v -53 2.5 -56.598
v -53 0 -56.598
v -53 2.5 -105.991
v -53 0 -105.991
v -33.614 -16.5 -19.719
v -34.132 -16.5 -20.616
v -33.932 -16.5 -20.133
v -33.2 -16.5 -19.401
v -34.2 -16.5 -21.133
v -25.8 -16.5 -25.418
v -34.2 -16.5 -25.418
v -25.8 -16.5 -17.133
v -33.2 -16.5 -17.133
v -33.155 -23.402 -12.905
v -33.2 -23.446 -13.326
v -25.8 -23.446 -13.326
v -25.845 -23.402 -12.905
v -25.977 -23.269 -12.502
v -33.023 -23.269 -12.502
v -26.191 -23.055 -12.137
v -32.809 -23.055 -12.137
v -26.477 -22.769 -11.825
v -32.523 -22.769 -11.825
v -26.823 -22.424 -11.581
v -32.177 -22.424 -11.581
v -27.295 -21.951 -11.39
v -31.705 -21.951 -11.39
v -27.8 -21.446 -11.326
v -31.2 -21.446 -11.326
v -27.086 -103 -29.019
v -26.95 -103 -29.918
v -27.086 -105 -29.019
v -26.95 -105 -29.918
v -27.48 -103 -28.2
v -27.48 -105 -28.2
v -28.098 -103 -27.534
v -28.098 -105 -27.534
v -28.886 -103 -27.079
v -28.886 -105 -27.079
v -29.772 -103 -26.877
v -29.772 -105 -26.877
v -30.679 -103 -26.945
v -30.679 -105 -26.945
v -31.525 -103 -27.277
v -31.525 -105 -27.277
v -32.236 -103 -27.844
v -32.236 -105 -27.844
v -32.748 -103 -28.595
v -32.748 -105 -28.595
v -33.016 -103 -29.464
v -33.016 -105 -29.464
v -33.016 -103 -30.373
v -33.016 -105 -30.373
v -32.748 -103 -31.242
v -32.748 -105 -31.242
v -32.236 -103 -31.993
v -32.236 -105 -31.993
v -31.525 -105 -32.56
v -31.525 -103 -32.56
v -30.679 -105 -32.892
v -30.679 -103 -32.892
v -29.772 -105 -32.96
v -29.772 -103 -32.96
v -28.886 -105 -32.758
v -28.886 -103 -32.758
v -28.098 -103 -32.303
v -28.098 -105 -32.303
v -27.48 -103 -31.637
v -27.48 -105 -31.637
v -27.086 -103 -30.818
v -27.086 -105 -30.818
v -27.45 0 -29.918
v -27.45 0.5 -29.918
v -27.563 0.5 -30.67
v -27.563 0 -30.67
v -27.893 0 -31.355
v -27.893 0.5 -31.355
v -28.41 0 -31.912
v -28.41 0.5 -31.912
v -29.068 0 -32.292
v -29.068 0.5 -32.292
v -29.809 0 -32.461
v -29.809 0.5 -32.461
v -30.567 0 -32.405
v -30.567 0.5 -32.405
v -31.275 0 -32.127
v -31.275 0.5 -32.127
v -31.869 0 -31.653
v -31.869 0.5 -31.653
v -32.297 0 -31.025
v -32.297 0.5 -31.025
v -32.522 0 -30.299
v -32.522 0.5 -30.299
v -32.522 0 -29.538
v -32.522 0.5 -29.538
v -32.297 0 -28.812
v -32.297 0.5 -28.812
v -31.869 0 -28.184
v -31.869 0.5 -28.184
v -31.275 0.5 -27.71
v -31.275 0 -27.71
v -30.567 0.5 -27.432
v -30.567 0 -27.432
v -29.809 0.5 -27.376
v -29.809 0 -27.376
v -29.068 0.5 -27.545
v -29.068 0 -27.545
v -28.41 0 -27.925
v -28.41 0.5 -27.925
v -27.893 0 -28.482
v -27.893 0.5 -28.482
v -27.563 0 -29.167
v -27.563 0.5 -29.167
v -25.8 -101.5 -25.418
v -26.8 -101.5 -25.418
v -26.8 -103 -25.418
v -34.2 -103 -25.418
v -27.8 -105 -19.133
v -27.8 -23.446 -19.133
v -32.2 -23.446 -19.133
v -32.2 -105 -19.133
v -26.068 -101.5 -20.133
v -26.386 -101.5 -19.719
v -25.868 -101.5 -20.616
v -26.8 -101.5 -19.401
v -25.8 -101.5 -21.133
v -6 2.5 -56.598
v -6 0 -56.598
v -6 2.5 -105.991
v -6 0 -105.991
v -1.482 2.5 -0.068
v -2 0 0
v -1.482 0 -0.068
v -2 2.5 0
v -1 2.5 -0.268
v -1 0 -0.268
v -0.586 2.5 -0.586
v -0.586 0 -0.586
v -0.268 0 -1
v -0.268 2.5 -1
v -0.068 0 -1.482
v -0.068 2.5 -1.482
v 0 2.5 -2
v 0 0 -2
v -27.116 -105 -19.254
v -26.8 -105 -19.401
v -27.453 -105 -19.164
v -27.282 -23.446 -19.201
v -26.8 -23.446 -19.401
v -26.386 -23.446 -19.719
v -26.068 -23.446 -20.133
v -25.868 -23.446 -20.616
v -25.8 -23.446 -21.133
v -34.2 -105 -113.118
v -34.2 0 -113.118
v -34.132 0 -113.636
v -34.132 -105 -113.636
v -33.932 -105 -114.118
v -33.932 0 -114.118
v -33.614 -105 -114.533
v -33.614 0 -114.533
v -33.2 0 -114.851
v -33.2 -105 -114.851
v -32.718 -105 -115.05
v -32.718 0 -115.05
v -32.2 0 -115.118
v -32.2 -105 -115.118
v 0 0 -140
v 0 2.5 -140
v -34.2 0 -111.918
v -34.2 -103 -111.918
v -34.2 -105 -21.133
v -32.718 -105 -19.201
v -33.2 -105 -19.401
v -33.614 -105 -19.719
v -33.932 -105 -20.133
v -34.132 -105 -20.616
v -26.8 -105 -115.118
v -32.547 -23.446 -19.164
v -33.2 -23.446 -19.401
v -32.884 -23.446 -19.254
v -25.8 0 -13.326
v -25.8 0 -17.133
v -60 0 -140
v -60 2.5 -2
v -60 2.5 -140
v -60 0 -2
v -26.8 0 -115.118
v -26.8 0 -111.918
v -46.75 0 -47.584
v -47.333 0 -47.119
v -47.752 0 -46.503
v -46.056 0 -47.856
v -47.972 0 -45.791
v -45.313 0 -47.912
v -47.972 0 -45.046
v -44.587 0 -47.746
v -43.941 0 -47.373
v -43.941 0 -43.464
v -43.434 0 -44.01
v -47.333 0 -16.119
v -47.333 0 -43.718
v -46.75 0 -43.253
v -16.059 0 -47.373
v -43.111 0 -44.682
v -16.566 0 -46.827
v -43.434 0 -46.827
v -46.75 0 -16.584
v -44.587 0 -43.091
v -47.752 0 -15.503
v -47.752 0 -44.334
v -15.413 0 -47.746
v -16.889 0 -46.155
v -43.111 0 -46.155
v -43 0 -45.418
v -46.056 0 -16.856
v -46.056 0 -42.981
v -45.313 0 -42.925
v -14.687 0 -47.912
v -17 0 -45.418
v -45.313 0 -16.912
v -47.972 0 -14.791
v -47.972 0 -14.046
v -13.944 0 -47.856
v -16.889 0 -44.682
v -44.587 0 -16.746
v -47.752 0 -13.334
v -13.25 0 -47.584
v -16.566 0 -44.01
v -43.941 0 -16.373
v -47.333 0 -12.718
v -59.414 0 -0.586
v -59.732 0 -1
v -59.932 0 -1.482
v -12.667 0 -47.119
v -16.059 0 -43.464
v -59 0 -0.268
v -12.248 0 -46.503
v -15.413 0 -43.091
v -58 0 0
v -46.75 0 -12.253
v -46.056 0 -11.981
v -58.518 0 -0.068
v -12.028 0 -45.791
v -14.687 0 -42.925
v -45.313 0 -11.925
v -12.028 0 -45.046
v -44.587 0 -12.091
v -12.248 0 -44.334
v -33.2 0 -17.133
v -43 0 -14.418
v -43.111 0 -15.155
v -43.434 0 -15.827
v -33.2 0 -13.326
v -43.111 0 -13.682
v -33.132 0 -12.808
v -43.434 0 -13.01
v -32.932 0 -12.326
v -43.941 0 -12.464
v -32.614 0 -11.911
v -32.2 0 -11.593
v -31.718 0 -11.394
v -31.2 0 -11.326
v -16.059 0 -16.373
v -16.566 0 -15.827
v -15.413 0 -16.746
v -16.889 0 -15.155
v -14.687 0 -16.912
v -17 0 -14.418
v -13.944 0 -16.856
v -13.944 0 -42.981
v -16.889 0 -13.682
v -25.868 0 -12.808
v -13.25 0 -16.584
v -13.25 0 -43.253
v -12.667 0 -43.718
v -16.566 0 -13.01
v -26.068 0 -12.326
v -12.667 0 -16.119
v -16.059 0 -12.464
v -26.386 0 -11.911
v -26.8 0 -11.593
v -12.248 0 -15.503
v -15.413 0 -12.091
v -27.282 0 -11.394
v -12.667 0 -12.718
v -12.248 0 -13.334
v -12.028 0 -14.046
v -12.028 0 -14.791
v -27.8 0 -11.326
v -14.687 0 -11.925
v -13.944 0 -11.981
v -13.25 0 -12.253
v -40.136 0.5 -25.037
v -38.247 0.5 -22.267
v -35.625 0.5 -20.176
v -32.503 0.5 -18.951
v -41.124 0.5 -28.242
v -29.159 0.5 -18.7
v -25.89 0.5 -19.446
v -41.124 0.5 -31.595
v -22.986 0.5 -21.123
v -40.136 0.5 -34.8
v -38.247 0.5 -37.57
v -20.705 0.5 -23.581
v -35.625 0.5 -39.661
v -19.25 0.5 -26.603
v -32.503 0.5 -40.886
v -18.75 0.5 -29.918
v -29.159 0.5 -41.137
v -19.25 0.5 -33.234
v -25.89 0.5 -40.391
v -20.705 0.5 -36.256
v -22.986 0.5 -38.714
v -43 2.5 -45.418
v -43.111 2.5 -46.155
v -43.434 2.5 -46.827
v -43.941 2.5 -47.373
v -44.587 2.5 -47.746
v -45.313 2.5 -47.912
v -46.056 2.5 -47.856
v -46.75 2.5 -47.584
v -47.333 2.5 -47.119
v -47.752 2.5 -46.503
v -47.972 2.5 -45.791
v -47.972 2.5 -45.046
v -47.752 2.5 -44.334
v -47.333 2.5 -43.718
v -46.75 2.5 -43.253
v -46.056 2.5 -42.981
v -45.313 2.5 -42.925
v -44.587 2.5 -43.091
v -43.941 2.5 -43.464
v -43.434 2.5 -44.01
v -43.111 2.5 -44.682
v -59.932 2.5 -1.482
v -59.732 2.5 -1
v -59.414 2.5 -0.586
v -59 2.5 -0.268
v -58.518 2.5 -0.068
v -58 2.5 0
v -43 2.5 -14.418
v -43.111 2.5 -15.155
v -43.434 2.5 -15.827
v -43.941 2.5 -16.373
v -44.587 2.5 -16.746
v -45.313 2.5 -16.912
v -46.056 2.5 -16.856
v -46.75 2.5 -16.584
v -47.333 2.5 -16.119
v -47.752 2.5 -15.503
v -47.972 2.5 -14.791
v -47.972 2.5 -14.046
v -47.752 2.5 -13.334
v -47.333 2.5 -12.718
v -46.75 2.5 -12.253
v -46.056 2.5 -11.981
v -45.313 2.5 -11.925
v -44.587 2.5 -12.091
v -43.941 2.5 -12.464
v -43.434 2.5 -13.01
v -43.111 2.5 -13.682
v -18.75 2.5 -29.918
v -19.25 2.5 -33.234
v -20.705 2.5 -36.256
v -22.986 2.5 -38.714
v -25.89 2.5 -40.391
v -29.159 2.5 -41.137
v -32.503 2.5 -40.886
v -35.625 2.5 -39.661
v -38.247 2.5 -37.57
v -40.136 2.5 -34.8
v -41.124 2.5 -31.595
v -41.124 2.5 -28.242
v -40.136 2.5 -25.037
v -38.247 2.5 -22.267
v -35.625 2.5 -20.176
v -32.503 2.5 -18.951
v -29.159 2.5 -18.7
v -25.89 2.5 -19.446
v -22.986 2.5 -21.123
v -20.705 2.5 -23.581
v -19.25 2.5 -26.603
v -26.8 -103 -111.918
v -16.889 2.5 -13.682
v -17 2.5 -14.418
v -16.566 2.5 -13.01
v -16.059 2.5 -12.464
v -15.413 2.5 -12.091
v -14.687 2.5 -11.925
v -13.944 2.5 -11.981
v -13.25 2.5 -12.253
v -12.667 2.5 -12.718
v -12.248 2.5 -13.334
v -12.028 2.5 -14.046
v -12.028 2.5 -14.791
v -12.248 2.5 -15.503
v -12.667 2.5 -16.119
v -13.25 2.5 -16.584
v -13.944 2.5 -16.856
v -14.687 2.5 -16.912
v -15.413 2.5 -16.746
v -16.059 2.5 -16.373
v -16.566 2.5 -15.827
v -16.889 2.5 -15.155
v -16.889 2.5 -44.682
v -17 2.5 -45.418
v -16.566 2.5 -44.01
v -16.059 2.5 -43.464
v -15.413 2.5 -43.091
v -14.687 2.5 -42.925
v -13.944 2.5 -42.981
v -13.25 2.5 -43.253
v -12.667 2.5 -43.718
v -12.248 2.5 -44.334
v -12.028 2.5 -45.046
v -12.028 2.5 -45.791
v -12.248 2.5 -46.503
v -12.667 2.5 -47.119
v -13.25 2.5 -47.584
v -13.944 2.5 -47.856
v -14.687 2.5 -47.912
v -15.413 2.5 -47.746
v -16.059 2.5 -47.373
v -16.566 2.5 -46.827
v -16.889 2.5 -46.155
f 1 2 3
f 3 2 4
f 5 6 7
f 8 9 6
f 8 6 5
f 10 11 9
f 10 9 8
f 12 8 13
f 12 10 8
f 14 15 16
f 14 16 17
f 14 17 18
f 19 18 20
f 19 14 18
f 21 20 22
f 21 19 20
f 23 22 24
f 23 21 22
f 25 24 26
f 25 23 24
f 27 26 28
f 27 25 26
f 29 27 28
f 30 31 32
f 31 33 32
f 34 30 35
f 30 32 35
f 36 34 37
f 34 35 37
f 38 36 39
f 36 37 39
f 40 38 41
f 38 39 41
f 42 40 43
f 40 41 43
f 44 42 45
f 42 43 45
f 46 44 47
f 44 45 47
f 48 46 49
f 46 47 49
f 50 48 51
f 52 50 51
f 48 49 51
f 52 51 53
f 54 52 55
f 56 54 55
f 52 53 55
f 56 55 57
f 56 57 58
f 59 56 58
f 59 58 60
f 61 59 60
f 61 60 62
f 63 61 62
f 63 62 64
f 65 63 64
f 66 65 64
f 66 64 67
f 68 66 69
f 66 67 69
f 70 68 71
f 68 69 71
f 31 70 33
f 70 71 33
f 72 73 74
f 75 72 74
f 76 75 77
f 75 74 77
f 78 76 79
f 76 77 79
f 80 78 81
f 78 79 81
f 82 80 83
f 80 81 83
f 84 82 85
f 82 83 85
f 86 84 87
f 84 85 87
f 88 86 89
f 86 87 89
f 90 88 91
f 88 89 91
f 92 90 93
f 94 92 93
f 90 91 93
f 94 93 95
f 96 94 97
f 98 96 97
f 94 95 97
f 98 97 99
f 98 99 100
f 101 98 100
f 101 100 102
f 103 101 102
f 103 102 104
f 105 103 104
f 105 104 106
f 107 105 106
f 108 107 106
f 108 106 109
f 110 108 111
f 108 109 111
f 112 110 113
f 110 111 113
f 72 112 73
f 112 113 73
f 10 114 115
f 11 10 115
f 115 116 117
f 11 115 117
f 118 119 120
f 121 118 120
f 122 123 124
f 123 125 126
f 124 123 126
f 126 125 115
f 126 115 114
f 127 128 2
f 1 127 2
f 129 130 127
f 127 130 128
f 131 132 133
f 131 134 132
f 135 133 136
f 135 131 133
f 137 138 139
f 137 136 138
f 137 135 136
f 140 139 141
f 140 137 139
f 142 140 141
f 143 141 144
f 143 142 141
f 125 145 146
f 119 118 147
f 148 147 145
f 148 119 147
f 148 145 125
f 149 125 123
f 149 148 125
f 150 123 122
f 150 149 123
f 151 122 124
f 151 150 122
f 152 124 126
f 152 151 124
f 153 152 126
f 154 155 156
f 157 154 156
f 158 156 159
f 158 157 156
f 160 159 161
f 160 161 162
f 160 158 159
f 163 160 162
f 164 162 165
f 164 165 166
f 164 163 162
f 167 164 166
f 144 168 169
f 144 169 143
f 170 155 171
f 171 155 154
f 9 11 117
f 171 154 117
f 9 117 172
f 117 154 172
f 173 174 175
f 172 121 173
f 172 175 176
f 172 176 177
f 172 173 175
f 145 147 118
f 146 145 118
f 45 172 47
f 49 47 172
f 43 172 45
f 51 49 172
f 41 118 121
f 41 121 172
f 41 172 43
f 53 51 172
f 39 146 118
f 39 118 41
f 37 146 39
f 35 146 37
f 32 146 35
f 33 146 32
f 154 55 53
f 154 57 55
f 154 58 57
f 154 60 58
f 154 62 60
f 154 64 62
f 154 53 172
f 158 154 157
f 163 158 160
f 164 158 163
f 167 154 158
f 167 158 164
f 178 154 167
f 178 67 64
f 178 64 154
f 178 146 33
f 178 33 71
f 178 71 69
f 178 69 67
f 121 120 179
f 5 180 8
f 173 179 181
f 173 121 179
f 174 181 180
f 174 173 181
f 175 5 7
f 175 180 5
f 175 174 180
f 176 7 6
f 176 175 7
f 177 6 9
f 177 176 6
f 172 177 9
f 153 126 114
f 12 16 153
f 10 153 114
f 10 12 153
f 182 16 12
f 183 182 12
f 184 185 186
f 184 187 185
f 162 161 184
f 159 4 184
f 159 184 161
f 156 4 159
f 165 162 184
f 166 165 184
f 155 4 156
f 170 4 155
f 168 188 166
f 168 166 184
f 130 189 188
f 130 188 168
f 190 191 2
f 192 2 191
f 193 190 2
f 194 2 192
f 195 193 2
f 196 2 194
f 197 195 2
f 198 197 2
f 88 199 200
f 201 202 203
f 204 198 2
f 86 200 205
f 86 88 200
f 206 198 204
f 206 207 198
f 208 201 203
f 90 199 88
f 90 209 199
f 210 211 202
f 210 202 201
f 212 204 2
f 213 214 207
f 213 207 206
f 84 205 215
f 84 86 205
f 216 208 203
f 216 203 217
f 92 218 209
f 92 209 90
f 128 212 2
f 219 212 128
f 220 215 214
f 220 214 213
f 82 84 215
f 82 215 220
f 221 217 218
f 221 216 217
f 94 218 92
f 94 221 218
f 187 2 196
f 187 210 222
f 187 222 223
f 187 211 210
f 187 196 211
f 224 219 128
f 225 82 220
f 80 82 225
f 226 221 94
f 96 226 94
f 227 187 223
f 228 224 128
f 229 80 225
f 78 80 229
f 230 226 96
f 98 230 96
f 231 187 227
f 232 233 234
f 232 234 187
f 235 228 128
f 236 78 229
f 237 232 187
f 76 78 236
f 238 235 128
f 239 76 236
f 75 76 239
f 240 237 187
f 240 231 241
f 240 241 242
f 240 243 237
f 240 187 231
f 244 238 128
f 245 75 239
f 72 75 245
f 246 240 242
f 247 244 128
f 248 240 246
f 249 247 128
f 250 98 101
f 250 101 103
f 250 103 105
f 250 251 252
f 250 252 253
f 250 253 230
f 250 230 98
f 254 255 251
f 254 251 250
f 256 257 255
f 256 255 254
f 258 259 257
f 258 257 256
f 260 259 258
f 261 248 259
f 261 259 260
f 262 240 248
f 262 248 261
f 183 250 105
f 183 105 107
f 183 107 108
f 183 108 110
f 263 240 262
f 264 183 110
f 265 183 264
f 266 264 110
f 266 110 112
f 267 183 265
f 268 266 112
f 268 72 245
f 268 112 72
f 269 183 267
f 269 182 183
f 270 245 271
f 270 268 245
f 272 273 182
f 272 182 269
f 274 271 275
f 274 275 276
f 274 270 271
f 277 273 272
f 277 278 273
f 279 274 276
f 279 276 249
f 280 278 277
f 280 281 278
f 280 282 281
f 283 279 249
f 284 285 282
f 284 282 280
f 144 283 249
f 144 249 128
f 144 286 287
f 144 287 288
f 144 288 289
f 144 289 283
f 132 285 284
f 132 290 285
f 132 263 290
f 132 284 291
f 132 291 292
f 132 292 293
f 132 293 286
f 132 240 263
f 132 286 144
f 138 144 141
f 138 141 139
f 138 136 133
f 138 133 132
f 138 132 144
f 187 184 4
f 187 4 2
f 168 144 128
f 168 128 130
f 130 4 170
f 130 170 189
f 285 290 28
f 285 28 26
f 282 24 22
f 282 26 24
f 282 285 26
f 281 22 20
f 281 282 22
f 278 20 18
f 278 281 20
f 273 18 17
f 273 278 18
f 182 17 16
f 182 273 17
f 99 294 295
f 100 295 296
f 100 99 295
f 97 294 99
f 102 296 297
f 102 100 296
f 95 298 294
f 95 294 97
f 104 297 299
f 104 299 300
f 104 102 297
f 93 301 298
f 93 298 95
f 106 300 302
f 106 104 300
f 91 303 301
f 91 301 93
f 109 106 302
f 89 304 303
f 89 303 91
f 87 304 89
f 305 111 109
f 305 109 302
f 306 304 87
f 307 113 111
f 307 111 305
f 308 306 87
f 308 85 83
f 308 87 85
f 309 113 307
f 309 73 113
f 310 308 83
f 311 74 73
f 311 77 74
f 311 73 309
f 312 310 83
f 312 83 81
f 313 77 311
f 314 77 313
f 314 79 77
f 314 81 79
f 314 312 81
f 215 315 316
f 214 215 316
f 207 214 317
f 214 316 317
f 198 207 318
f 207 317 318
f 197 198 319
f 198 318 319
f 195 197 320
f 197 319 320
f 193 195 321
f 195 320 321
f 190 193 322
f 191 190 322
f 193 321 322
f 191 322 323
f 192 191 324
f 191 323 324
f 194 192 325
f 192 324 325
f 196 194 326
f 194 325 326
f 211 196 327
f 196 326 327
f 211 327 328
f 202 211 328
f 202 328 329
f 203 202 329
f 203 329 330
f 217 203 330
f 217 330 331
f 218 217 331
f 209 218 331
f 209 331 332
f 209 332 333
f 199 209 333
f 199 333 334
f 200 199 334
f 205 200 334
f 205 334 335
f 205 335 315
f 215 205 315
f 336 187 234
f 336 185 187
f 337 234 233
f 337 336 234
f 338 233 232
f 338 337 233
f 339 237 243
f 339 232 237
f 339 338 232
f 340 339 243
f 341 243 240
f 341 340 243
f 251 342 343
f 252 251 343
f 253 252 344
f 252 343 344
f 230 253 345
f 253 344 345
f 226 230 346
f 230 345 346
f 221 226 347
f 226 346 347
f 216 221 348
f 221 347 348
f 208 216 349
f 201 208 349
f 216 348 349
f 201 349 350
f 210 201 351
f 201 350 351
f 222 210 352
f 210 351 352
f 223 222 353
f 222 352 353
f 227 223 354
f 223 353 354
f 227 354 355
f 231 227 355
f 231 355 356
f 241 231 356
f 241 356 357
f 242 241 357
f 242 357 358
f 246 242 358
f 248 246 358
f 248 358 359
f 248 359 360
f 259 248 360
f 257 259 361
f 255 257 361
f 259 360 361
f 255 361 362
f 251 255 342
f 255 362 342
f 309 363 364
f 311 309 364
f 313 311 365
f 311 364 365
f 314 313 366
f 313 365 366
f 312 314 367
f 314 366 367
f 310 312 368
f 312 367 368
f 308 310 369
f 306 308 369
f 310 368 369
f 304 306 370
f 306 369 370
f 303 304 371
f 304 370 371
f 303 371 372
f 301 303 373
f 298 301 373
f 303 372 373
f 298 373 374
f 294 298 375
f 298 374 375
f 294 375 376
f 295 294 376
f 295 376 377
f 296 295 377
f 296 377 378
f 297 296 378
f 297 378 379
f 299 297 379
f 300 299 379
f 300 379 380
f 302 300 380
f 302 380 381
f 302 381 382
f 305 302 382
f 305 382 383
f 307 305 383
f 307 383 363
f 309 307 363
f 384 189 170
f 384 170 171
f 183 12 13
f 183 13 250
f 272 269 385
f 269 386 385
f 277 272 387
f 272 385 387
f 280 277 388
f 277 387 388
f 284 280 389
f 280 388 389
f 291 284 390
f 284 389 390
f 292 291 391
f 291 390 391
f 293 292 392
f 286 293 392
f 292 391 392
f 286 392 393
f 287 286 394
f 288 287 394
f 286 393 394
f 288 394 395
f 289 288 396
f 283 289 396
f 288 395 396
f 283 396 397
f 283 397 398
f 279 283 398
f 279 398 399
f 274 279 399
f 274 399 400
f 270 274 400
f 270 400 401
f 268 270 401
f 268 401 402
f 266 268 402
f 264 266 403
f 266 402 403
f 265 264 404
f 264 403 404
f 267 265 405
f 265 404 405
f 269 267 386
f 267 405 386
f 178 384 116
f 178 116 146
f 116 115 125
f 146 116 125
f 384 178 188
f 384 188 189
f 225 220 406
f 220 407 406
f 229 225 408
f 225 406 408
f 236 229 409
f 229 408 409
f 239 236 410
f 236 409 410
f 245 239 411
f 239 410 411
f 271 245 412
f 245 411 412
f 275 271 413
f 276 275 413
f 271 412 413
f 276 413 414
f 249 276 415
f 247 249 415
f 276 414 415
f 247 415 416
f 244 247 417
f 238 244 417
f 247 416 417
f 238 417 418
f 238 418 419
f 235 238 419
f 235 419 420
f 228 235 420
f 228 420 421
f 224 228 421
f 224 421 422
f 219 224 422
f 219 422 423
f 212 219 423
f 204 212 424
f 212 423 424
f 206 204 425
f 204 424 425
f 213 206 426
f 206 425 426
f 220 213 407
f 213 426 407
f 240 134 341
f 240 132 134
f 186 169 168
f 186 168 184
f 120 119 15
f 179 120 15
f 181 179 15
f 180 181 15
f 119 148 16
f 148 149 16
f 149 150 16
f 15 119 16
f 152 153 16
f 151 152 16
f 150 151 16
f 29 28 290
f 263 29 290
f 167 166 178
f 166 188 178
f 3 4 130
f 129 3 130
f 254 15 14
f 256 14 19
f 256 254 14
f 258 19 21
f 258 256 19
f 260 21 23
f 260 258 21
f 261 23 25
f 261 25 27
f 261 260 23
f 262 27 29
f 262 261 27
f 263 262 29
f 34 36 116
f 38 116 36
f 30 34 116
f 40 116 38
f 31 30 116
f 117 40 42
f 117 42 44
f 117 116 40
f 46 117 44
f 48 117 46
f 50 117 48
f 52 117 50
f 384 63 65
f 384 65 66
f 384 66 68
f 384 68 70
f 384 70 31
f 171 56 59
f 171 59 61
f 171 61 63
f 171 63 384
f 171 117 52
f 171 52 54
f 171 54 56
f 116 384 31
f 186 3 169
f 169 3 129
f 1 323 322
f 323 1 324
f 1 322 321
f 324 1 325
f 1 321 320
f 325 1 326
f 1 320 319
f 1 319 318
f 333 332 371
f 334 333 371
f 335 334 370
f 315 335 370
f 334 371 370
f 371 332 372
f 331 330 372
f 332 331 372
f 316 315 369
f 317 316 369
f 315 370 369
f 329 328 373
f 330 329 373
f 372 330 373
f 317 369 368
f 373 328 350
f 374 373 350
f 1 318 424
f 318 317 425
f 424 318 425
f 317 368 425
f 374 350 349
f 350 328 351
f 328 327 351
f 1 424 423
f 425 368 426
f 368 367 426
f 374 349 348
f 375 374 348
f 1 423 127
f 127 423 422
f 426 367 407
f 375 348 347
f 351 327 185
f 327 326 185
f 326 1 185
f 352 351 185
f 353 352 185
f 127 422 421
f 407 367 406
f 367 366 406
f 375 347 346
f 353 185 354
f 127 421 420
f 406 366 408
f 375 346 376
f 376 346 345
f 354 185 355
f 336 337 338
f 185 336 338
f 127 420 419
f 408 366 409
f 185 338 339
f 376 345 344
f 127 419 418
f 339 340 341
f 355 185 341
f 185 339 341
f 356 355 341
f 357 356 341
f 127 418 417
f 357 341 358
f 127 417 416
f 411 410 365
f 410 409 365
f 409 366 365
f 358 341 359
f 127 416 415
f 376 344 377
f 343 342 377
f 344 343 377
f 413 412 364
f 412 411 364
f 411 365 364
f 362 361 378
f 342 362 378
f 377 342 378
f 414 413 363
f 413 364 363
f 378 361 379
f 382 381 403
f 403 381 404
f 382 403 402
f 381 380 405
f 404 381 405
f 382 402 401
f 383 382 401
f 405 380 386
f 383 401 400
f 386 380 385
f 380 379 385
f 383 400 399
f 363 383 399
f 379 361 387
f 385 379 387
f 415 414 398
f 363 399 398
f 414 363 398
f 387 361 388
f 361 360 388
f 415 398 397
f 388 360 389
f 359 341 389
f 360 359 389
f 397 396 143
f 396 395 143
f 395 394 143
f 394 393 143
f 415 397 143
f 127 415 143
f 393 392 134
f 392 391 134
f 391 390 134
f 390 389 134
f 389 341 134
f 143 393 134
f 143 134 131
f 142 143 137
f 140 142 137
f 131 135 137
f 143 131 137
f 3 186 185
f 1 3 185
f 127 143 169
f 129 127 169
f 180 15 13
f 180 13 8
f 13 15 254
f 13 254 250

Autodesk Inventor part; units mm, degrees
ref_plane "YZ Plane" through (0, 0, 0) normal (1, 0, 0) x (0, 1, 0)
ref_plane "XZ Plane" through (0, 0, 0) normal (0, 1, 0) x (-1, 0, 0)
ref_plane "XY Plane" through (0, 0, 0) normal (0, 0, 1) x (1, 0, 0)
sketch "草图1" plane through (0, 0, 0) normal (0, 1, 0) x (-1, 0, 0)
  line L0 (0, 0) -> (60, 0)
  line L1 (60, 0) -> (60, -140)
  line L2 (60, -140) -> (0, -140)
  line L3 (0, -140) -> (0, 0)
  dimension "d0" = 60
  dimension "d1" = 140
extrude "拉伸1" add sketch "草图1" along normal blind 2.5
sketch "草图2" plane through (0, 2.5, 0) normal (0, 1, 0) x (1, 0, 0)
  line L0 (0, 140) -> (-60, 140) projected
  line L1 (-60, 140) -> (-60, 0) projected
  line L2 (-60, 0) -> (0, 0) projected
  line L3 (0, 0) -> (0, 140) projected
  line L4 (-60, 0) -> (0, 0) projected
  line L5 (-30, 0) -> (-30, 146.6003)
  line L6 (-30, 8.9185) -> (-51, 8.9185)
  line L7 (-51, 8.9185) -> (-51, 50.9185)
  line L8 (-51, 50.9185) -> (-30, 50.9185)
  line L9 (-30, 50.9185) -> (-30, 8.9185)
  line L10 (-30, 8.9185) -> (-9, 8.9185)
  line L11 (-9, 8.9185) -> (-9, 50.9185)
  line L12 (-9, 50.9185) -> (-30, 50.9185)
  circle A0 centre (-45.5, 14.4185) radius 2.9433
  line L13 (-51, 29.9185) -> (-35.5931, 29.9185)
  circle A1 centre (-45.5, 45.4185) radius 2.9433
  circle A2 centre (-14.5, 14.4185) radius 2.9433
  circle A3 centre (-14.5, 45.4185) radius 2.9433
  circle A4 centre (-30, 29.9185) radius 2.55
  circle A5 centre (-30, 29.9185) radius 11.25
  dimension "d4" = 21
  dimension "d5" = 42
  dimension "d6" = 31
  dimension "d7" = 31
  dimension "d12" = 5.1
  dimension "d15" = 22.5
extrude "拉伸4" cut sketch "草图2" along normal mid plane 10 contours A4 L5 | L5 A4
extrude "拉伸5" cut sketch "草图2" against normal blind 10 contours A5 L5 A4 | L5 A4 A5 | A4 L5 | L5 A4
extrude "拉伸6" cut sketch "草图2" against normal blind 10 contours A5 L5 A4 | L5 A4 A5 | A4 L5 | L5 A4
sketch "草图6" plane through (0, 0, 0) normal (0, -1, 0) x (1, 0, 0)
  line L0 (-9, -8.9185) -> (-51, -8.9185) projected
  circle A0 centre (-30, -29.9185) radius 2.55 projected
  line L1 (-30, -29.9185) -> (-26.8, -29.9185)
  line L2 (-26.8, -29.9185) -> (-26.8, -111.9185)
  line L3 (-30, -29.9185) -> (-30, -39.9264)
  line L4 (-30, -29.9185) -> (-33.2, -29.9185)
  line L5 (-33.2, -29.9185) -> (-33.2, -111.9185)
  line L6 (-26.8, -111.9185) -> (-31.6, -111.9185)
  line L7 (-31.6, -111.9185) -> (-33.2, -111.9185)
  line L8 (-26.8, -111.9185) -> (-33.2, -111.9185)
  line L9 (-33.2, -111.9185) -> (-33.2, -115.1185)
  line L10 (-33.2, -115.1185) -> (-26.8, -115.1185)
  line L11 (-26.8, -115.1185) -> (-26.8, -111.9185)
  point P0 (0, 0)
  dimension "d20" = 3.2
  dimension "d21" = 82
  dimension "d22" = 3.2
extrude "拉伸7" add sketch "草图6" along normal blind 105 contours L11 L10 L9 L7 L6
sketch "草图7" plane through (-33.2, 0, -111.9185) normal (0, 0, 1) x (1, 0, 0)
  line L0 (0, 0) -> (6.4, 0) projected
  line L1 (0, 0) -> (0, -105) projected
  line L2 (6.4, -105) -> (0, -105) projected
  line L3 (6.4, 0) -> (6.4, -105) projected
  line L4 (6.4, 0) -> (6.4, -105) projected
  line L5 (0, 0) -> (0, -105) projected
  line L6 (6.4, -105) -> (0, -105)
  line L7 (0, -105) -> (0, -101.5)
  line L8 (0, -101.5) -> (6.4, -101.5)
  line L9 (6.4, -101.5) -> (6.4, -105)
  point P0 (33.2, 0)
  dimension "d25" = 3.5
sketch "草图8" plane through (0, -105, 0) normal (0, -1, 0) x (1, 0, 0)
  line L0 (-26.8, -111.9185) -> (-26.8, -115.1185) projected
  line L1 (-26.8, -115.1185) -> (-33.2, -115.1185) projected
  line L2 (-33.2, -115.1185) -> (-33.2, -111.9185) projected
  line L3 (-33.2, -111.9185) -> (-26.8, -111.9185) projected
  circle A0 centre (-30, -29.9185) radius 11.25 projected
  line L4 (0, -140) -> (-60, -140) projected
  line L5 (0, 0) -> (0, -140) projected
  line L6 (-60, 0) -> (0, 0) projected
  line L7 (-60, -140) -> (-60, 0) projected
  line L8 (-26.8, -111.9185) -> (-26.8, -29.9185)
  line L9 (-26.8, -29.9185) -> (-33.2, -29.9185)
  line L10 (-33.2, -29.9185) -> (-33.2, -111.9185)
  line L11 (-33.2, -111.9185) -> (-26.8, -111.9185)
  line L12 (-26.8, -111.9185) -> (-26.8, -29.9185)
  circle A1 centre (-30, -29.9185) radius 3.2
  line L13 (-26.8, -29.9185) -> (-26.8, -14.9185)
  line L14 (-26.8, -14.9185) -> (-33.2, -14.9185)
  line L15 (-33.2, -14.9185) -> (-33.2, -29.9185)
  circle A2 centre (-30, -29.9185) radius 2.55 projected
  line L16 (-26.8, -14.9185) -> (-26.8, -25.4185)
  line L17 (-26.8, -25.4185) -> (-33.2, -25.4185)
  dimension "d26" = 15
  dimension "d40" = 10.5
extrude "拉伸8" add sketch "草图8" against normal blind 3.5 contours L3 L10 A0 L8 | A0 L10 A1 L8 | A1 L9 A2 | L9 A2 A1 | A1 L15 L17 L13 | L15 L14 L13 A0 | A0 L13 L17 L15
sketch "草图10" plane through (0, -105, 0) normal (0, -1, 0) x (1, 0, 0)
  line L0 (-26.8, -111.9185) -> (-26.8, -115.1185) projected
  line L1 (-26.8, -115.1185) -> (-33.2, -115.1185) projected
  line L2 (-33.2, -115.1185) -> (-33.2, -111.9185) projected
  line L3 (-33.2, -111.9185) -> (-26.8, -111.9185) projected
  circle A0 centre (-30, -29.9185) radius 11.25 projected
  line L4 (0, -140) -> (-60, -140) projected
  line L5 (0, 0) -> (0, -140) projected
  line L6 (-60, 0) -> (0, 0) projected
  line L7 (-60, -140) -> (-60, 0) projected
  circle A1 centre (-30, -29.9185) radius 2.55 projected
  line L8 (-33.2, -14.9185) -> (-33.2, -115.1185) projected
  line L9 (-33.2, -115.1185) -> (-26.8, -115.1185) projected
  line L10 (-26.8, -115.1185) -> (-26.8, -14.9185) projected
  line L11 (-26.8, -14.9185) -> (-33.2, -14.9185) projected
  circle A2 centre (-30, -29.9185) radius 3.05
  point P0 (-33.2, -19.1332)
  point P1 (-26.8, -19.1332)
  dimension "d31" = 6.1
extrude "拉伸9" add sketch "草图10" against normal up to surface (105 mm away) contours A0 L8 L11 L10
extrude "拉伸10" cut sketch "草图10" against normal up to surface (3.5 mm away) contours A2
sketch "草图11" plane through (-33.2, -105, -115.1185) normal (-1, 0, 0) x (0, 0, 1)
  line L0 (3.2, 3.5) -> (95.9853, 3.5) projected
  line L1 (3.2, 105) -> (3.2, 3.5) projected
  line L2 (0, 105) -> (3.2, 105) projected
  line L3 (0, 105) -> (0, 0) projected
  line L4 (100.2, 0) -> (0, 0) projected
  line L5 (100.2, 0) -> (100.2, 105) projected
  line L6 (95.9853, 105) -> (100.2, 105) projected
  line L7 (95.9853, 3.5) -> (95.9853, 105) projected
  point P0 (115.1185, 105)
extrude "拉伸11" add sketch "草图11" along normal blind 1
sketch "草图12" plane through (0, 0, 0) normal (0, -1, 0) x (1, 0, 0)
  point P0 (0, 0)
extrude "拉伸12" add sketch "草图2" against normal up to surface (2.5 mm away) contours A5 L5 A4 | L5 A4 A5
sketch "草图13" plane through (-30, 2.5, -29.9185) normal (0, 1, 0) x (1, 0, 0)
  point P0 (30, -29.9185)
extrude "拉伸13" cut sketch "草图2" against normal blind 2 contours A5 L5 A4 | L5 A4 A5
sketch "草图14" plane through (0, -105, 0) normal (0, -1, 0) x (1, 0, 0)
  circle A0 centre (-30, -29.9185) radius 3.05 projected
  line L0 (-26.8, -115.1185) -> (-34.2, -115.1185) projected
  line L1 (-26.8, -14.9185) -> (-34.2, -14.9185) projected
  line L2 (-34.2, -115.1185) -> (-34.2, -14.9185) projected
  line L3 (-34.2, -115.1185) -> (-34.2, -14.9185) projected
  line L4 (-34.2, -19.1332) -> (-34.2, -14.9185) projected
  line L5 (-34.2, -19.1332) -> (-34.2, -111.9185) projected
  line L6 (-34.2, -115.1185) -> (-34.2, -111.9185) projected
  line L7 (-33.2, -19.1332) -> (-34.2, -19.1332) projected
  line L8 (-34.2, -19.1332) -> (-25.8, -19.1332)
  line L9 (-25.8, -115.1185) -> (-25.8, -14.9185) projected
  line L10 (-26.8, -115.1185) -> (-26.8, -14.9185) projected
  point P0 (0, 0)
  point P1 (-26.8, -19.1332)
extrude "拉伸14" cut sketch "草图14" against normal up to surface (105 mm away) contours L8 L7 L2 L1 L10
sketch "草图15" plane through (0, -101.5, 0) normal (0, 1, 0) x (1, 0, 0)
  line L0 (-34.2, 111.9185) -> (-26.8, 111.9185) projected
  line L1 (-34.2, 19.1332) -> (-34.2, 111.9185) projected
  circle A0 centre (-30, 29.9185) radius 3.05 projected
  line L2 (-26.8, 25.4185) -> (-33.2, 25.4185) projected
  line L3 (-26.8, 14.9185) -> (-26.8, 25.4185) projected
  line L4 (-34.2, 19.1332) -> (-26.8, 19.1332) projected
  line L5 (-26.8, 19.1332) -> (-26.8, 111.9185) projected
  point P0 (0, 0)
sketch "草图16" plane through (0, -105, 0) normal (0, -1, 0) x (1, 0, 0)
  line L0 (-26.8, -25.4185) -> (-33.2, -25.4185) projected
  line L1 (-34.2, -115.1185) -> (-34.2, -19.1332) projected
  line L2 (-26.8, -115.1185) -> (-34.2, -115.1185) projected
  circle A0 centre (-30, -29.9185) radius 3.05 projected
  line L3 (-26.8, -19.1332) -> (-34.2, -19.1332) projected
  line L4 (-26.8, -115.1185) -> (-26.8, -19.1332) projected
  point P0 (0, 0)
sketch "草图17" plane through (0, -101.5, 0) normal (0, 1, 0) x (1, 0, 0)
  line L0 (-25.8, 19.1332) -> (-34.2, 19.1332) projected
  line L1 (-25.8, 19.1332) -> (-25.8, 111.9185) projected
  line L2 (-34.2, 19.1332) -> (-25.8, 19.1332)
  line L3 (-25.8, 19.1332) -> (-25.8, 25.4182)
  line L4 (-25.8, 25.4182) -> (-34.2, 25.4182)
  line L5 (-34.2, 25.4182) -> (-34.2, 19.1332)
  point P0 (0, 0)
  dimension "d43" = 6.285
extrude "拉伸15" add sketch "草图17" along normal up to surface (101.5 mm away)
fillet "圆角1" radius 2 3 edges at (-34.2, -52.5, -19.1332) (-25.8, -50.75, -19.1332) (-34.2, -52.5, -115.1185)
sketch "草图18" plane through (0, 2.5, 0) normal (0, 1, 0) x (1, 0, 0)
  circle A0 centre (-30, 29.9185) radius 11.25 projected
  line L0 (0, 140) -> (-60, 140) projected
  line L1 (-60, 140) -> (-60, 0) projected
  line L2 (-60, 0) -> (0, 0) projected
  line L3 (0, 0) -> (0, 140) projected
  circle A1 centre (-45.5, 14.4185) radius 2.5
  line L4 (-30, 29.9185) -> (-30, 12.6275)
  circle A2 centre (-45.5, 45.4185) radius 2.5
  point P0 (-14.5, 14.4185)
  dimension "d47" = 5
  dimension "d48" = 5
extrude "拉伸16" cut sketch "草图18" against normal blind 10 contours A1 | A2
ref_plane "工作平面2" through (-30, 0, -140) normal (-1, 0, 0) x (0, 0, 1)
mirror "镜像2" about plane through (-30, 0, -140) normal (-1, 0, 0) of "拉伸16"
sketch "草图19" plane through (0, 0, 0) normal (0, -1, 0) x (1, 0, 0)
  line L0 (0, -140) -> (-60, -140) projected
  line L1 (0, -140) -> (-110, -140)
  line L2 (-110, -140) -> (-110, -250)
  line L3 (-110, -250) -> (0, -250)
  line L4 (0, -250) -> (0, -140)
  circle A0 centre (-8, -146.46) radius 1.6
  circle A1 centre (-8, -242) radius 1.6
  circle A2 centre (-103.1, -146.46) radius 1.6
  circle A3 centre (-103.1, -242) radius 1.6
  point P0 (0, 0)
  dimension "d51" = 110
  dimension "d52" = 110
  dimension "d53" = 3.2
  dimension "d54" = 3.2
  dimension "d55" = 95.54
  dimension "d56" = 8
  dimension "d57" = 3.2
  dimension "d58" = 95.1
  dimension "d59" = 3.2
  dimension "d74" = 8
  dimension "d75" = 8
  dimension "d76" = 95.1
extrude "拉伸17" add sketch "草图19" against normal up to surface (2.5 mm away)
sketch "草图20" plane through (-25.8, -101.5, -25.4182) normal (1, 0, 0) x (0, 0, -1)
  line L0 (-4.285, 0) -> (-4.285, 101.5) projected
  line L1 (-4.285, 0) -> (0, 0) projected
  line L2 (0, 0) -> (0, 101.5) projected
  line L3 (-4.285, 101.5) -> (0, 101.5) projected
  line L4 (-4.285, 0) -> (-4.285, 101.5) projected
  line L5 (-4.285, 101.5) -> (-4.285, 85)
  line L6 (-4.285, 85) -> (0, 85)
  line L7 (0, 0) -> (0, 101.5) projected
  line L8 (-4.285, 85) -> (-8.285, 85)
  line L9 (-8.285, 85) -> (-8.285, 101.5)
  line L10 (114.5818, 101.5) -> (-25.4182, 101.5) projected
  line L11 (-6.285, 78.0536) -> (-14.0927, 78.0536)
  line L12 (-14.0927, 78.0536) -> (-14.0927, 101.5)
  line L13 (-6.285, 101.5) -> (-6.285, -3.5) projected
  point P0 (-6.285, 85)
  dimension "d62" = 16.5
  dimension "d63" = 4
extrude "拉伸18" cut sketch "草图20" along normal mid plane 20.75 contours L8 L13 L10 L0 | L0 L3 L2 L6 | L8 L9 L10 L13
extrude "拉伸19" add sketch "草图20" against normal blind 7.4 contours L13 L11 L12 L10 L9 L8
sketch "草图21" plane through (-25.8, -23.4464, -19.1332) normal (0, 0, -1) x (-1, 0, 0)
  line L0 (2, 6.9464) -> (2, 0) projected
  line L1 (0, 6.9464) -> (2, 6.9464) projected
  line L2 (0, 0) -> (0, 6.9464) projected
  line L3 (0, 0) -> (2, 0) projected
  line L4 (6.4, 0) -> (6.4, 6.9464) projected
  line L5 (6.4, 0) -> (7.4, 0) projected
  line L6 (7.4, 6.9464) -> (7.4, 0) projected
  line L7 (6.4, 6.9464) -> (7.4, 6.9464) projected
  point P0 (-25.8, 23.4464)
extrude "拉伸20" add sketch "草图21" along normal blind 2.5
fillet "圆角2" radius 2 3 edges at (-29.5, -23.4464, -11.3254) (-25.8, -11.7232, -11.3254) (-33.2, -11.7232, -11.3254)
sketch "草图22" plane through (0, -105, 0) normal (0, -1, 0) x (1, 0, 0)
  circle A0 centre (-30, -29.9185) radius 3.05 projected
  circle A1 centre (-30, -29.9185) radius 3.2 projected
  point P0 (0, 0)
sketch "草图23" plane through (0, -105, 0) normal (0, -1, 0) x (1, 0, 0)
  circle A0 centre (-30, -29.9185) radius 2.55 projected
  point P0 (0, 0)
sketch "草图24" plane through (0, -105, 0) normal (0, -1, 0) x (1, 0, 0)
  point P0 (0, 0)
sketch "草图25" plane through (0, -105, 0) normal (0, -1, 0) x (1, 0, 0)
  circle A0 centre (-30, -29.9185) radius 2.75
  point P0 (0, 0)
  dimension "d71" = 5.5
extrude "拉伸21" cut sketch "草图25" against normal blind 2.5
sketch "草图26" plane through (0, 0, 0) normal (1, 0, 0) x (0, 0, -1)
  point P0 (0, 0)
sketch "草图27" plane through (0, 2.5, 0) normal (0, 1, 0) x (1, 0, 0)
  circle A0 centre (-8, 146.46) radius 1.6 projected
  circle A1 centre (-8, 242) radius 1.6 projected
  circle A2 centre (-103.1, 146.46) radius 1.6 projected
  circle A3 centre (-103.1, 242) radius 1.6 projected
  circle A4 centre (-14.5, 14.4185) radius 2.5 projected
  circle A5 centre (-14.5, 45.4185) radius 2.5 projected
  circle A6 centre (-45.5, 14.4185) radius 2.5 projected
  circle A7 centre (-45.5, 45.4185) radius 2.5 projected
  circle A8 centre (-30, 29.9185) radius 11.25 projected
  line L0 (-60, 140) -> (-60, 0) projected
  line L1 (-60, 0) -> (0, 0) projected
  line L2 (0, 0) -> (0, 250) projected
  line L3 (-110, 250) -> (0, 250) projected
  line L4 (-110, 140) -> (-110, 250) projected
  line L5 (-60, 140) -> (-110, 140) projected
  circle A9 centre (-8, 154.4212) radius 1.6
  circle A10 centre (-8, 234.4212) radius 1.6
  dimension "d77" = 3.2
  dimension "d78" = 3.2
  dimension "d79" = 80
extrude "拉伸22" cut sketch "草图27" against normal up to surface (2.5 mm away) contours A9 | A10
sketch "草图28" plane through (0, 0, 0) normal (0, -1, 0) x (1, 0, 0)
  line L0 (-12.63, -150.06) -> (-99.8327, -150.06)
  line L1 (-99.8327, -150.06) -> (-99.8327, -239)
  line L2 (-99.8327, -239) -> (-12.63, -239)
  line L3 (-12.63, -239) -> (-12.63, -150.06)
  circle A0 centre (-8, -146.46) radius 1.6 projected
  circle A1 centre (-8, -242) radius 1.6 projected
  point P0 (0, 0)
  dimension "d82" = 3.6
  dimension "d83" = 3
extrude "拉伸23" cut sketch "草图28" against normal blind 10 contours L3 L2 L1 L0
fillet "圆角3" radius 2 5 edges at (-110, 1.25, -250) (0, 1.25, -250) (-110, 1.25, -140) (-60, 1.25, 0) (0, 1.25, 0)
sketch "草图29" plane through (0, 0, 0) normal (0, -1, 0) x (1, 0, 0)
  line L0 (-6, -56.5984) -> (-53, -56.5984)
  line L1 (-53, -56.5984) -> (-53, -105.9913)
  line L2 (-53, -105.9913) -> (-6, -105.9913)
  line L3 (-6, -105.9913) -> (-6, -56.5984)
  line L4 (-60, -140) -> (-60, -2) projected
  line L5 (0, -2) -> (0, -248) projected
  point P0 (0, 0)
  dimension "d87" = 7
  dimension "d88" = 6
extrude "拉伸24" cut sketch "草图29" against normal blind 10
sketch "草图30" plane through (-30, 0, -140) normal (-1, 0, 0) x (0, 0, 1)
  point P0 (140, 0)
sketch "草图31" plane through (0, 0, 0) normal (0, -1, 0) x (1, 0, 0)
  line L0 (-6, -105.9913) -> (-53, -105.9913) projected
  line L1 (-53, -105.9913) -> (-53, -56.5984) projected
  line L2 (-53, -56.5984) -> (-6, -56.5984) projected
  line L3 (-6, -56.5984) -> (-6, -105.9913) projected
  circle A0 centre (-8, -146.46) radius 1.6 projected
  circle A1 centre (-8, -242) radius 1.6 projected
  circle A2 centre (-103.1, -146.46) radius 1.6 projected
  circle A3 centre (-103.1, -242) radius 1.6 projected
  circle A4 centre (-14.5, -14.4185) radius 2.5 projected
  circle A5 centre (-14.5, -45.4185) radius 2.5 projected
  circle A6 centre (-45.5, -14.4185) radius 2.5 projected
  circle A7 centre (-45.5, -45.4185) radius 2.5 projected
  circle A8 centre (-30, -29.9185) radius 2.55 projected
  arc A9 (0, -2) -> (-2, 0) centre (-2, -2) ccw projected
  line L4 (-58, 0) -> (-2, 0) projected
  arc A10 (-58, 0) -> (-60, -2) centre (-58, -2) ccw projected
  line L5 (-60, -140) -> (-60, -2) projected
  line L6 (-60, -140) -> (-108, -140) projected
  arc A11 (-108, -140) -> (-110, -142) centre (-108, -142) ccw projected
  line L7 (-110, -142) -> (-110, -248) projected
  arc A12 (-110, -248) -> (-108, -250) centre (-108, -248) ccw projected
  line L8 (-108, -250) -> (-2, -250) projected
  arc A13 (-2, -250) -> (0, -248) centre (-2, -248) ccw projected
  line L9 (0, -2) -> (0, -248) projected
  line L10 (-34.2, -111.9185) -> (-26.8, -111.9185) projected
  line L11 (-26.8, -111.9185) -> (-26.8, -115.1185) projected
  line L12 (-26.8, -115.1185) -> (-32.2, -115.1185) projected
  arc A14 (-34.2, -113.1185) -> (-32.2, -115.1185) centre (-32.2, -113.1185) ccw projected
  line L13 (-34.2, -113.1185) -> (-34.2, -111.9185) projected
  line L14 (-31.2, -11.3254) -> (-27.8, -11.3254) projected
  arc A15 (-25.8, -13.3254) -> (-27.8, -11.3254) centre (-27.8, -13.3254) ccw projected
  line L15 (-25.8, -13.3254) -> (-25.8, -17.1332) projected
  line L16 (-25.8, -17.1332) -> (-33.2, -17.1332) projected
  line L17 (-33.2, -17.1332) -> (-33.2, -13.3254) projected
  arc A16 (-31.2, -11.3254) -> (-33.2, -13.3254) centre (-31.2, -13.3254) ccw projected
  circle A17 centre (-8, -234.4212) radius 1.6 projected
  circle A18 centre (-8, -154.4212) radius 1.6 projected
  line L18 (-12.63, -239) -> (-99.8327, -239) projected
  line L19 (-99.8327, -239) -> (-99.8327, -150.06) projected
  line L20 (-99.8327, -150.06) -> (-12.63, -150.06) projected
  line L21 (-12.63, -150.06) -> (-12.63, -239) projected
  line L22 (0, -2) -> (0, -248) projected
  line L23 (-60, -140) -> (-60, -2) projected
  line L24 (0, -140) -> (-60, -140)
  point P0 (0, 0)
extrude "拉伸25" cut sketch "草图31" along normal blind 10 and the other way blind 5 contours L9 A13 L8 A12 L7 A11 L6 L24
sketch "草图32" plane through (-34.2, -105, -115.1185) normal (-1, 0, 0) x (0, 0, 1)
  line L0 (89.7003, 3.5) -> (3.2, 3.5) projected
  line L1 (89.7003, 3.5) -> (89.7003, 2)
  line L2 (89.7003, 2) -> (3.2, 2)
  line L3 (2, 0) -> (2, 105) projected
  line L4 (3.2, 105) -> (3.2, 3.5) projected
  line L5 (3.2, 2) -> (3.2, 3.5)
  point P0 (115.1185, 105)
  dimension "d95" = 1.5
extrude "拉伸26" cut sketch "草图32" against normal blind 10
properties part number "42底座2"
